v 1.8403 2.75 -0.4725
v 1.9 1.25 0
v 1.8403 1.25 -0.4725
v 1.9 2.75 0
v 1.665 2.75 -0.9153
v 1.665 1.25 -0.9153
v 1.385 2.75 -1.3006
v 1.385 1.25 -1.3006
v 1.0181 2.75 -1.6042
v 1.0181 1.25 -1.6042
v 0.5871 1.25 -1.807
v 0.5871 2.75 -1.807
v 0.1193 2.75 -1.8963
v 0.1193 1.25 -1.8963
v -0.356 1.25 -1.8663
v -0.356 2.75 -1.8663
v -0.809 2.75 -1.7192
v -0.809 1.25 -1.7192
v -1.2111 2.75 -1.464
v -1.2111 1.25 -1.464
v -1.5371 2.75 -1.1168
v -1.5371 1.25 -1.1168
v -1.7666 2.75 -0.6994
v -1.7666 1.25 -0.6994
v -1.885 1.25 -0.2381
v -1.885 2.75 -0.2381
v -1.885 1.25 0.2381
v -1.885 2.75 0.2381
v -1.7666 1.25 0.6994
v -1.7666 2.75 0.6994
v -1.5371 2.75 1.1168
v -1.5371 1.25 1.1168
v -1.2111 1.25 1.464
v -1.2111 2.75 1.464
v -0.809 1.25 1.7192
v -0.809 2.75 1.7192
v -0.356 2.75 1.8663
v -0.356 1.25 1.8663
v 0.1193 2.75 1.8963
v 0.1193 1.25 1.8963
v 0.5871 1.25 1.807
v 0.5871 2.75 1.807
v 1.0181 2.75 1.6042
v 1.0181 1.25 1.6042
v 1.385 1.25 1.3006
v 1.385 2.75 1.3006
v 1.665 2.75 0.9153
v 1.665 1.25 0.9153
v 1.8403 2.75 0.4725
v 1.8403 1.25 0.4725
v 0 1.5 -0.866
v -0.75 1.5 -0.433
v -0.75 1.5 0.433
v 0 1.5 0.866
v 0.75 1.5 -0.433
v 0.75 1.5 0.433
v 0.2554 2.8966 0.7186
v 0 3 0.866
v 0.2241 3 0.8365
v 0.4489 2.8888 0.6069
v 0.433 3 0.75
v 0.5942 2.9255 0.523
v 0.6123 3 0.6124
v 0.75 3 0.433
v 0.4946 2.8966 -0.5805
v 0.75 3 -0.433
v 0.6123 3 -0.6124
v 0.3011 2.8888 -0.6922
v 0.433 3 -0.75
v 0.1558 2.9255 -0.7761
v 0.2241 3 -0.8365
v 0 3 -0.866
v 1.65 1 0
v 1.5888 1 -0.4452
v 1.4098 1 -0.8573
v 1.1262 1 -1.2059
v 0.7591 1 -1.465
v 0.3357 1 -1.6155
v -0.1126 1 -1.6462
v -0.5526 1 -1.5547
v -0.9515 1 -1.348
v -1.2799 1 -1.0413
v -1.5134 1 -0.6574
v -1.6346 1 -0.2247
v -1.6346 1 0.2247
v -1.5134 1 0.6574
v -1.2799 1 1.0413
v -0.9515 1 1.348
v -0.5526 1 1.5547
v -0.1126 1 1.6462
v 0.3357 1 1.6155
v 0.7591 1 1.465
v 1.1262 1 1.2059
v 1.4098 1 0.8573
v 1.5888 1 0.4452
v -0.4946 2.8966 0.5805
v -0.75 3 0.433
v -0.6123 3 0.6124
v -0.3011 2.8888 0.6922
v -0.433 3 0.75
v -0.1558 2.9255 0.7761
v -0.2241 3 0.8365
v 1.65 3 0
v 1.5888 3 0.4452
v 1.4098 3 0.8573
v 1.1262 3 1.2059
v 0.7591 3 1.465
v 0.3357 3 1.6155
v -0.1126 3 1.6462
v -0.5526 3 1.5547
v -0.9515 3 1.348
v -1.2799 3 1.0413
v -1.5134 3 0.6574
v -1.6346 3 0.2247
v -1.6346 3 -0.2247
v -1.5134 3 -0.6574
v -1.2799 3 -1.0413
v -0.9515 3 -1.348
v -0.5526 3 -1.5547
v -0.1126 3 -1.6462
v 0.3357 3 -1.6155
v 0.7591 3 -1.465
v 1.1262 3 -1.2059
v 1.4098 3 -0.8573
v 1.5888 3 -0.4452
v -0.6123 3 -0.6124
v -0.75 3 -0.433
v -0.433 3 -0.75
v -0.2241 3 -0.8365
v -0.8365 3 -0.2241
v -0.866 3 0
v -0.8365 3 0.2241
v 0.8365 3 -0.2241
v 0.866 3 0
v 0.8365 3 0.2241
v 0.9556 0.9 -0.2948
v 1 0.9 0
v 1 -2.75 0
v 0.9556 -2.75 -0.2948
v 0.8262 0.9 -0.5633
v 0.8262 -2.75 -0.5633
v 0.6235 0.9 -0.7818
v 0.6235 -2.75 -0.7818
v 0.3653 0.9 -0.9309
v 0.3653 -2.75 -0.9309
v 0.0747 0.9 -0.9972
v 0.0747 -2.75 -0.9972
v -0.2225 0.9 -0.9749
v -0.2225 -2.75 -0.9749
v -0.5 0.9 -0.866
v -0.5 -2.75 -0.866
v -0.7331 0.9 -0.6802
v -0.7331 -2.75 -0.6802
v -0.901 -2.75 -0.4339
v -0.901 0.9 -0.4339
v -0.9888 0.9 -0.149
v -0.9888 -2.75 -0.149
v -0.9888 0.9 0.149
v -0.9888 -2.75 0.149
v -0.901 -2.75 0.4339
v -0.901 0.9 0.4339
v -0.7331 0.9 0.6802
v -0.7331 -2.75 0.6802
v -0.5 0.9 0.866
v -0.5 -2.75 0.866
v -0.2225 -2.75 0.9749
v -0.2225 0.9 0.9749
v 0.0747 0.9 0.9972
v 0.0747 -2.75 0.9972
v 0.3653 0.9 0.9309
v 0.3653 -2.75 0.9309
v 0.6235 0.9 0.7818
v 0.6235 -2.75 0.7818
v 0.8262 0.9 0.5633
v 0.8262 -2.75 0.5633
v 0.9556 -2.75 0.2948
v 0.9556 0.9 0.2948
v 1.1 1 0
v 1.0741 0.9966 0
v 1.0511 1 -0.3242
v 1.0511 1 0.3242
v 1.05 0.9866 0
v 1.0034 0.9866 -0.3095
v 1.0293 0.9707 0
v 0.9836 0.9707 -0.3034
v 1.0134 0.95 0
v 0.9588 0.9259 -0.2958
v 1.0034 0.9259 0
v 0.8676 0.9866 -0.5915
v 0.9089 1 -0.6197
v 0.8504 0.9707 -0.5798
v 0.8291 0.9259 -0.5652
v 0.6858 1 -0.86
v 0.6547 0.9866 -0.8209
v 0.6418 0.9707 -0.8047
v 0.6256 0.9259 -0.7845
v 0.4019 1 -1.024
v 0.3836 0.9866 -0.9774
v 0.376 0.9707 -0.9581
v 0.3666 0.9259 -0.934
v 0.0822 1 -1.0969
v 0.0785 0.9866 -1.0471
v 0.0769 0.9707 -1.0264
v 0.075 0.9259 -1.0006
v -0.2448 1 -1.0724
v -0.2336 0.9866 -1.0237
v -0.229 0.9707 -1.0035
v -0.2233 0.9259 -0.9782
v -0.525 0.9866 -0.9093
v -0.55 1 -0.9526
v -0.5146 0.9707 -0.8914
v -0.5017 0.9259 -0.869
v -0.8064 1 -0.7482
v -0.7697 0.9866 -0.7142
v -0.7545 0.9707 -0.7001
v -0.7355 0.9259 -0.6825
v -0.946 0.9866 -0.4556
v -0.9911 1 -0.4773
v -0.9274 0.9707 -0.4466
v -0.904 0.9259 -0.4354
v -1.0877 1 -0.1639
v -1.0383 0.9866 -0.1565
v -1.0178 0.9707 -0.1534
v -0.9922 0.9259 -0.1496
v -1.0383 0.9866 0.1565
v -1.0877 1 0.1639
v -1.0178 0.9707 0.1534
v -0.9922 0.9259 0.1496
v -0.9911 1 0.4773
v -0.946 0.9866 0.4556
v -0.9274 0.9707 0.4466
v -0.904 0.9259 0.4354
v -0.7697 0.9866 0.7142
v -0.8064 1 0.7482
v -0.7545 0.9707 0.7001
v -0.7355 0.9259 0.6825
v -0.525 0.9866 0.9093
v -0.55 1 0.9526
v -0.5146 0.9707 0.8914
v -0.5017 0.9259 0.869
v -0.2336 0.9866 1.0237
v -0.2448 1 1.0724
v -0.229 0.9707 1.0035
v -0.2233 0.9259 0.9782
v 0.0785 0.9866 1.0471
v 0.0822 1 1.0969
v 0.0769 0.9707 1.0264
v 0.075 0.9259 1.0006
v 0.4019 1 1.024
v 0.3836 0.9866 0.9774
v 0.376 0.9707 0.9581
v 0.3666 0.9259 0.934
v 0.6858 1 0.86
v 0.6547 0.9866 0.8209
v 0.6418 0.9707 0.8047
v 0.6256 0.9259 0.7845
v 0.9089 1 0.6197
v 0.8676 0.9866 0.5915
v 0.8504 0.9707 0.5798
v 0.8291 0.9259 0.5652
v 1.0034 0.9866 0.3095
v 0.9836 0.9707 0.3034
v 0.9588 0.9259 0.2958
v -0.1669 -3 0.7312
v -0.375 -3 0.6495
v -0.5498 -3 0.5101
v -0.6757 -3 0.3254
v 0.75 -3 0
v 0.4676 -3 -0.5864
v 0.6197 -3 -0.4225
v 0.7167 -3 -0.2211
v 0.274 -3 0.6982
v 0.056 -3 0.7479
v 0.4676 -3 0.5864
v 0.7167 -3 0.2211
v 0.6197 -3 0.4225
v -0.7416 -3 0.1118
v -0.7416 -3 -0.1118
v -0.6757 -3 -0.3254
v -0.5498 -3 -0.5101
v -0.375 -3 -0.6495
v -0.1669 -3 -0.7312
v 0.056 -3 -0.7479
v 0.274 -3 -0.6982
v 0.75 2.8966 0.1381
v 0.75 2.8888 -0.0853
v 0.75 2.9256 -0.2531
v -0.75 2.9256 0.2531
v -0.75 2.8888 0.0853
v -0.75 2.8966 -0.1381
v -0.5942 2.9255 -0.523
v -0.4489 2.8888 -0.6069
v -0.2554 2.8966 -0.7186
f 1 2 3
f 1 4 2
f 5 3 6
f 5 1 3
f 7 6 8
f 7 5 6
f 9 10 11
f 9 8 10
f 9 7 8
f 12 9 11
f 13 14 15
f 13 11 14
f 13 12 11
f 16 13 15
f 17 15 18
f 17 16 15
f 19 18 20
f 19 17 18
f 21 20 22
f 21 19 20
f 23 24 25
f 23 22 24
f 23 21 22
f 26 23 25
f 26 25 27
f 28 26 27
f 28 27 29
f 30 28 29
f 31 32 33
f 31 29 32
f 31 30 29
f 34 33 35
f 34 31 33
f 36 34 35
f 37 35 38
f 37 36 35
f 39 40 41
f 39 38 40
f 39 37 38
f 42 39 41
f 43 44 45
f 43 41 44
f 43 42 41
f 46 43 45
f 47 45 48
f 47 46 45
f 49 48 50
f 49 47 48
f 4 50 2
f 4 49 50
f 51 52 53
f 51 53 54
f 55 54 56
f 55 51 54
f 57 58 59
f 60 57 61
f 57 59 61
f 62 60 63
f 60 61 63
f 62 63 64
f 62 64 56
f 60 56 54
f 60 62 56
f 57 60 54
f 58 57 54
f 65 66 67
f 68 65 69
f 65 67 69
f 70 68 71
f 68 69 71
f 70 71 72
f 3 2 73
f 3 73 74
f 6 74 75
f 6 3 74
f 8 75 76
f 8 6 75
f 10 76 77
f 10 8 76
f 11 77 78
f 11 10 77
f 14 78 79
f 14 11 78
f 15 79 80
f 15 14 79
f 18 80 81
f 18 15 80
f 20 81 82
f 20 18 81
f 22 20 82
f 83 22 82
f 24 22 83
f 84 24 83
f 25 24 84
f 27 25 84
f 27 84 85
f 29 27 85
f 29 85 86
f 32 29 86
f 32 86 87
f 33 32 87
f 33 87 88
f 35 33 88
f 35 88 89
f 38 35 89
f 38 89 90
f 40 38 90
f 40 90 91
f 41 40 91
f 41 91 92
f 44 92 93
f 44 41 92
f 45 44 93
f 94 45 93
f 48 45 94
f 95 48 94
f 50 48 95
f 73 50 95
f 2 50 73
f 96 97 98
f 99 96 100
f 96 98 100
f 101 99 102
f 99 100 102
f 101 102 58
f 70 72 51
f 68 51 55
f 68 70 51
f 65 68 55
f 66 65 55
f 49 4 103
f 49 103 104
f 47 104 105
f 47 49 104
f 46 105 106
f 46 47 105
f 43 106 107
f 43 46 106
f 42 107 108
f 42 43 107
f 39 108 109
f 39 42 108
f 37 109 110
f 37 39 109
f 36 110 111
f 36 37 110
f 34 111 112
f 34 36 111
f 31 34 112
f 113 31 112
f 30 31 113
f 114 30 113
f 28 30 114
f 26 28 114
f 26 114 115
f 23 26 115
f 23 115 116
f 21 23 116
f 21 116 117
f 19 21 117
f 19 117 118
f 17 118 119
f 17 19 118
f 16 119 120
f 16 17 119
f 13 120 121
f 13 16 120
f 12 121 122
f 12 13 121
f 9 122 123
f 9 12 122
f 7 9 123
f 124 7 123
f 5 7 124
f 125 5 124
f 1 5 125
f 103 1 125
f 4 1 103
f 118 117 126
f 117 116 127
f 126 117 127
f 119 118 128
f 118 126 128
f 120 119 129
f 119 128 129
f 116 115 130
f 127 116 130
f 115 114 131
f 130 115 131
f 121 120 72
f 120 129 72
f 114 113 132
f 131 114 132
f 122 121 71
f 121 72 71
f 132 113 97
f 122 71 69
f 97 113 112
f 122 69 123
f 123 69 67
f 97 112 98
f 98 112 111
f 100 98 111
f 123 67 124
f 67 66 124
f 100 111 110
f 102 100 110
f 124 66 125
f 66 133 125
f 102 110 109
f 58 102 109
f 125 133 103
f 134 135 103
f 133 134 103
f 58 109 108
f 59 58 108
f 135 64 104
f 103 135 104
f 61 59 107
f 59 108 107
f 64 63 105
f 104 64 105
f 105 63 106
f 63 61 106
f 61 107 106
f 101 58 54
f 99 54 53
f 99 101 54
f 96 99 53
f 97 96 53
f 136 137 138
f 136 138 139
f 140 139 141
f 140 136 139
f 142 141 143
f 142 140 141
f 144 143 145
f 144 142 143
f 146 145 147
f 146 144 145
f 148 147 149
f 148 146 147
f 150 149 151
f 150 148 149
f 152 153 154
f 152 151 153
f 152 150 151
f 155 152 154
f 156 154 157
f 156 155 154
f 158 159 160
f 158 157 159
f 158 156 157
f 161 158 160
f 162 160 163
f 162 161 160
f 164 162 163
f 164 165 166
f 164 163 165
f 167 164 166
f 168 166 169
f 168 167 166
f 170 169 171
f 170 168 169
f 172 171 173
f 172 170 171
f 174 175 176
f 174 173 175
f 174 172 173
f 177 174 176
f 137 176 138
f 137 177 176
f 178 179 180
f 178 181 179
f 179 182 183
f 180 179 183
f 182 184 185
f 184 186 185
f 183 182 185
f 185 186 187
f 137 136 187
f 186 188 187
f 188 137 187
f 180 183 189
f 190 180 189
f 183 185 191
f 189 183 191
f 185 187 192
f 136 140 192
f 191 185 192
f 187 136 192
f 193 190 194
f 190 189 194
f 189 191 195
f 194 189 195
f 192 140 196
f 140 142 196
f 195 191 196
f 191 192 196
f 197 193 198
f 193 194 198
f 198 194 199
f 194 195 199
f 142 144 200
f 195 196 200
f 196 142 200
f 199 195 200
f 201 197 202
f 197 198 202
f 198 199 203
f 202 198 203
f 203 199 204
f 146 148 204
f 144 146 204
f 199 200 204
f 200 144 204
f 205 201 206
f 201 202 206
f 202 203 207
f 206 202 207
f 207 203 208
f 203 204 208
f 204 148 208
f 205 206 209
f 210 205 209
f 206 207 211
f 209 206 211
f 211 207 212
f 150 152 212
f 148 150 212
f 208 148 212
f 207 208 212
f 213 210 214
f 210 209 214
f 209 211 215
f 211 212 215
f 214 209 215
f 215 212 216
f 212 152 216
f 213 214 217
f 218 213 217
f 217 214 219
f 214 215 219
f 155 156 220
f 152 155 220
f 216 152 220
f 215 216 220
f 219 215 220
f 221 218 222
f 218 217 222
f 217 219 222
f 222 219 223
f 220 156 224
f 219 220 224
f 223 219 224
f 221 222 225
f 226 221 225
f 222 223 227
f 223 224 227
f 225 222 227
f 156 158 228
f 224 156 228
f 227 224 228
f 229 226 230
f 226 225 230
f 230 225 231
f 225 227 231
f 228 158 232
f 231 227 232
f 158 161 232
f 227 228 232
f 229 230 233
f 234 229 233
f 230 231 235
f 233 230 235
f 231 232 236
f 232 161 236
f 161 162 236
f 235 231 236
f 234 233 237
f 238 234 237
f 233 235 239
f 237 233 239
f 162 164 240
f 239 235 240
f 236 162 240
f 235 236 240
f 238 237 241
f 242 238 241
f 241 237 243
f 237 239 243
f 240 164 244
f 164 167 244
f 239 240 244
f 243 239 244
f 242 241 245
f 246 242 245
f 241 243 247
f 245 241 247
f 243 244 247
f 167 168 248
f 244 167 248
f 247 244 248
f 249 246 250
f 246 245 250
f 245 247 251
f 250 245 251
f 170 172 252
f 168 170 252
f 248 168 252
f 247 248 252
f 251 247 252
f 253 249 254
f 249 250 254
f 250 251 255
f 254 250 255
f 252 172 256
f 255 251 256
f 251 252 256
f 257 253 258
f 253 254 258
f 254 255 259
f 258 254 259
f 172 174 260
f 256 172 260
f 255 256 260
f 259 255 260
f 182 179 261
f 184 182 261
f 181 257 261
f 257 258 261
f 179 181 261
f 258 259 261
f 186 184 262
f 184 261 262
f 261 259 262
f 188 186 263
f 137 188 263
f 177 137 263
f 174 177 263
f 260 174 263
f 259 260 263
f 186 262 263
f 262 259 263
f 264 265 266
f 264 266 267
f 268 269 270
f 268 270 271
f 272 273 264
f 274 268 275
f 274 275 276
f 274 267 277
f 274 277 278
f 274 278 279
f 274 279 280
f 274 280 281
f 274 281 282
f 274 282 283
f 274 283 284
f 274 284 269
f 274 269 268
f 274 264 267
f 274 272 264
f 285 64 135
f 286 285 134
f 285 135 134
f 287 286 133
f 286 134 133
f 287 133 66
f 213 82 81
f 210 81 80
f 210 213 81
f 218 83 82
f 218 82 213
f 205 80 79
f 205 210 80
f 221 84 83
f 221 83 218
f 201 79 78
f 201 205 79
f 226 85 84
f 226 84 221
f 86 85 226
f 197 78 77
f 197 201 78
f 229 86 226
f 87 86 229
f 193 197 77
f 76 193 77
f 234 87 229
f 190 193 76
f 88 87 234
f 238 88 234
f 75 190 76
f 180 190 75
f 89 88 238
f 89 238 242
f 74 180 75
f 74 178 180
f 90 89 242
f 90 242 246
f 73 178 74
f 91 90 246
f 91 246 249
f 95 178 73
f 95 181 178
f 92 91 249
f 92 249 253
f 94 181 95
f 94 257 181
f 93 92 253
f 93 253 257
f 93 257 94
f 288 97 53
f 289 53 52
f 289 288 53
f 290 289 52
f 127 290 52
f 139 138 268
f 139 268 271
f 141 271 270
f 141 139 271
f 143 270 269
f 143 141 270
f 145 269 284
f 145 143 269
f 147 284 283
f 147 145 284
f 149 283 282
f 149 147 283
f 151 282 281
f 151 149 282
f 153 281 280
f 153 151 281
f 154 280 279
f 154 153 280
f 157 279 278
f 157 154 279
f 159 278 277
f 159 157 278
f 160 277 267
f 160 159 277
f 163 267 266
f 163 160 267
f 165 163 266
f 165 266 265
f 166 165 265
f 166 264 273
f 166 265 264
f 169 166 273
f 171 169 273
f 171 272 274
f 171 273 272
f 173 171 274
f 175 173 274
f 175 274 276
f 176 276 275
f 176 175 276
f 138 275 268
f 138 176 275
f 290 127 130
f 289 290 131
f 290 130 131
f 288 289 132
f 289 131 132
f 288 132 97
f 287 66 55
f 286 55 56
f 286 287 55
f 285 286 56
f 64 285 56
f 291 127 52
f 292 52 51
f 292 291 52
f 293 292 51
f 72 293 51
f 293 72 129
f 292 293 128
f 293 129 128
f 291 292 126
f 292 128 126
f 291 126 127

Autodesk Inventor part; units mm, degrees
ref_plane "YZ Plane" through (0, 0, 0) normal (1, 0, 0) x (0, 1, 0)
ref_plane "XZ Plane" through (0, 0, 0) normal (0, 1, 0) x (-1, 0, 0)
ref_plane "XY Plane" through (0, 0, 0) normal (0, 0, 1) x (1, 0, 0)
sketch "Sketch1" plane through (0, 0, 0) normal (0, 0, 1) x (1, 0, 0)
  line L0 (0, 3) -> (0, -3)
  line L1 (0, -3) -> (0.75, -3)
  line L2 (0.75, -3) -> (1, -2.75)
  line L3 (1, -2.75) -> (1, 0.9)
  line L4 (1.1, 1) -> (1.65, 1)
  line L5 (1.9, 1.25) -> (1.9, 2.75)
  line L6 (1.65, 3) -> (0, 3)
  arc A0 (1.1, 1) -> (1, 0.9) centre (1.1, 0.9) ccw
  line L7 (1.65, 3) -> (1.9, 2.75)
  line L8 (1.65, 1) -> (1.9, 1.25)
  point P0 (0, 0)
  point P1 (1.9, 1)
  point P2 (1.9, 3)
  point P3 (0, 0)
  dimension "d0" = 3.8
  dimension "d1" = 2
  dimension "d3" = 2
  dimension "d4" = 2.2
  dimension "d5" = 135
  dimension "d6" = 0.25
  dimension "d7" = 4
  dimension "d18" = 0.25
revolve "Revolution1" add sketch "Sketch1" angle 360 about axis through (0, 3, 0) along (0, -1, 0)
sketch "Sketch2" plane through (0, 3, 0) normal (0, 1, 0) x (1, 0, 0)
  line L0 (0, -0.866) -> (-0.75, -0.433)
  line L1 (-0.75, -0.433) -> (-0.75, 0.433)
  line L2 (-0.75, 0.433) -> (0, 0.866)
  line L3 (0, 0.866) -> (0.75, 0.433)
  line L4 (0.75, 0.433) -> (0.75, -0.433)
  line L5 (0.75, -0.433) -> (0, -0.866)
  point P0 (0, 0)
  point P1 (0, 0)
  dimension "d11" = 1.5
extrude "Extrusion1" cut sketch "Sketch2" against normal blind 1.5
thread "Thread1" size "M2x0.4" class "6g" standard "ANSI Metric M Profile" full length
sketch "Sketch3" plane through (0, 0, 0) normal (1, 0, 0) x (0, 1, 0)
  line L0 (3, 0.866) -> (3, 0.433) projected
  line L1 (3, 0.866) -> (2.5, 0.366)
  line L2 (2.5, 0.366) -> (3, 0.366)
  line L3 (3, 0.366) -> (3, 0.866)
  line L4 (-0.6, 0) -> (3.6, 0) projected
  point P0 (0, 0)
  dimension "d16" = 0.5
revolve "Revolution2" cut sketch "Sketch3" angle 360 about axis through (0, -10, 0) along (0, 1, 0)
properties part number "Bolt_M2x0.4_4mm_SH" material "Stainless Steel"
